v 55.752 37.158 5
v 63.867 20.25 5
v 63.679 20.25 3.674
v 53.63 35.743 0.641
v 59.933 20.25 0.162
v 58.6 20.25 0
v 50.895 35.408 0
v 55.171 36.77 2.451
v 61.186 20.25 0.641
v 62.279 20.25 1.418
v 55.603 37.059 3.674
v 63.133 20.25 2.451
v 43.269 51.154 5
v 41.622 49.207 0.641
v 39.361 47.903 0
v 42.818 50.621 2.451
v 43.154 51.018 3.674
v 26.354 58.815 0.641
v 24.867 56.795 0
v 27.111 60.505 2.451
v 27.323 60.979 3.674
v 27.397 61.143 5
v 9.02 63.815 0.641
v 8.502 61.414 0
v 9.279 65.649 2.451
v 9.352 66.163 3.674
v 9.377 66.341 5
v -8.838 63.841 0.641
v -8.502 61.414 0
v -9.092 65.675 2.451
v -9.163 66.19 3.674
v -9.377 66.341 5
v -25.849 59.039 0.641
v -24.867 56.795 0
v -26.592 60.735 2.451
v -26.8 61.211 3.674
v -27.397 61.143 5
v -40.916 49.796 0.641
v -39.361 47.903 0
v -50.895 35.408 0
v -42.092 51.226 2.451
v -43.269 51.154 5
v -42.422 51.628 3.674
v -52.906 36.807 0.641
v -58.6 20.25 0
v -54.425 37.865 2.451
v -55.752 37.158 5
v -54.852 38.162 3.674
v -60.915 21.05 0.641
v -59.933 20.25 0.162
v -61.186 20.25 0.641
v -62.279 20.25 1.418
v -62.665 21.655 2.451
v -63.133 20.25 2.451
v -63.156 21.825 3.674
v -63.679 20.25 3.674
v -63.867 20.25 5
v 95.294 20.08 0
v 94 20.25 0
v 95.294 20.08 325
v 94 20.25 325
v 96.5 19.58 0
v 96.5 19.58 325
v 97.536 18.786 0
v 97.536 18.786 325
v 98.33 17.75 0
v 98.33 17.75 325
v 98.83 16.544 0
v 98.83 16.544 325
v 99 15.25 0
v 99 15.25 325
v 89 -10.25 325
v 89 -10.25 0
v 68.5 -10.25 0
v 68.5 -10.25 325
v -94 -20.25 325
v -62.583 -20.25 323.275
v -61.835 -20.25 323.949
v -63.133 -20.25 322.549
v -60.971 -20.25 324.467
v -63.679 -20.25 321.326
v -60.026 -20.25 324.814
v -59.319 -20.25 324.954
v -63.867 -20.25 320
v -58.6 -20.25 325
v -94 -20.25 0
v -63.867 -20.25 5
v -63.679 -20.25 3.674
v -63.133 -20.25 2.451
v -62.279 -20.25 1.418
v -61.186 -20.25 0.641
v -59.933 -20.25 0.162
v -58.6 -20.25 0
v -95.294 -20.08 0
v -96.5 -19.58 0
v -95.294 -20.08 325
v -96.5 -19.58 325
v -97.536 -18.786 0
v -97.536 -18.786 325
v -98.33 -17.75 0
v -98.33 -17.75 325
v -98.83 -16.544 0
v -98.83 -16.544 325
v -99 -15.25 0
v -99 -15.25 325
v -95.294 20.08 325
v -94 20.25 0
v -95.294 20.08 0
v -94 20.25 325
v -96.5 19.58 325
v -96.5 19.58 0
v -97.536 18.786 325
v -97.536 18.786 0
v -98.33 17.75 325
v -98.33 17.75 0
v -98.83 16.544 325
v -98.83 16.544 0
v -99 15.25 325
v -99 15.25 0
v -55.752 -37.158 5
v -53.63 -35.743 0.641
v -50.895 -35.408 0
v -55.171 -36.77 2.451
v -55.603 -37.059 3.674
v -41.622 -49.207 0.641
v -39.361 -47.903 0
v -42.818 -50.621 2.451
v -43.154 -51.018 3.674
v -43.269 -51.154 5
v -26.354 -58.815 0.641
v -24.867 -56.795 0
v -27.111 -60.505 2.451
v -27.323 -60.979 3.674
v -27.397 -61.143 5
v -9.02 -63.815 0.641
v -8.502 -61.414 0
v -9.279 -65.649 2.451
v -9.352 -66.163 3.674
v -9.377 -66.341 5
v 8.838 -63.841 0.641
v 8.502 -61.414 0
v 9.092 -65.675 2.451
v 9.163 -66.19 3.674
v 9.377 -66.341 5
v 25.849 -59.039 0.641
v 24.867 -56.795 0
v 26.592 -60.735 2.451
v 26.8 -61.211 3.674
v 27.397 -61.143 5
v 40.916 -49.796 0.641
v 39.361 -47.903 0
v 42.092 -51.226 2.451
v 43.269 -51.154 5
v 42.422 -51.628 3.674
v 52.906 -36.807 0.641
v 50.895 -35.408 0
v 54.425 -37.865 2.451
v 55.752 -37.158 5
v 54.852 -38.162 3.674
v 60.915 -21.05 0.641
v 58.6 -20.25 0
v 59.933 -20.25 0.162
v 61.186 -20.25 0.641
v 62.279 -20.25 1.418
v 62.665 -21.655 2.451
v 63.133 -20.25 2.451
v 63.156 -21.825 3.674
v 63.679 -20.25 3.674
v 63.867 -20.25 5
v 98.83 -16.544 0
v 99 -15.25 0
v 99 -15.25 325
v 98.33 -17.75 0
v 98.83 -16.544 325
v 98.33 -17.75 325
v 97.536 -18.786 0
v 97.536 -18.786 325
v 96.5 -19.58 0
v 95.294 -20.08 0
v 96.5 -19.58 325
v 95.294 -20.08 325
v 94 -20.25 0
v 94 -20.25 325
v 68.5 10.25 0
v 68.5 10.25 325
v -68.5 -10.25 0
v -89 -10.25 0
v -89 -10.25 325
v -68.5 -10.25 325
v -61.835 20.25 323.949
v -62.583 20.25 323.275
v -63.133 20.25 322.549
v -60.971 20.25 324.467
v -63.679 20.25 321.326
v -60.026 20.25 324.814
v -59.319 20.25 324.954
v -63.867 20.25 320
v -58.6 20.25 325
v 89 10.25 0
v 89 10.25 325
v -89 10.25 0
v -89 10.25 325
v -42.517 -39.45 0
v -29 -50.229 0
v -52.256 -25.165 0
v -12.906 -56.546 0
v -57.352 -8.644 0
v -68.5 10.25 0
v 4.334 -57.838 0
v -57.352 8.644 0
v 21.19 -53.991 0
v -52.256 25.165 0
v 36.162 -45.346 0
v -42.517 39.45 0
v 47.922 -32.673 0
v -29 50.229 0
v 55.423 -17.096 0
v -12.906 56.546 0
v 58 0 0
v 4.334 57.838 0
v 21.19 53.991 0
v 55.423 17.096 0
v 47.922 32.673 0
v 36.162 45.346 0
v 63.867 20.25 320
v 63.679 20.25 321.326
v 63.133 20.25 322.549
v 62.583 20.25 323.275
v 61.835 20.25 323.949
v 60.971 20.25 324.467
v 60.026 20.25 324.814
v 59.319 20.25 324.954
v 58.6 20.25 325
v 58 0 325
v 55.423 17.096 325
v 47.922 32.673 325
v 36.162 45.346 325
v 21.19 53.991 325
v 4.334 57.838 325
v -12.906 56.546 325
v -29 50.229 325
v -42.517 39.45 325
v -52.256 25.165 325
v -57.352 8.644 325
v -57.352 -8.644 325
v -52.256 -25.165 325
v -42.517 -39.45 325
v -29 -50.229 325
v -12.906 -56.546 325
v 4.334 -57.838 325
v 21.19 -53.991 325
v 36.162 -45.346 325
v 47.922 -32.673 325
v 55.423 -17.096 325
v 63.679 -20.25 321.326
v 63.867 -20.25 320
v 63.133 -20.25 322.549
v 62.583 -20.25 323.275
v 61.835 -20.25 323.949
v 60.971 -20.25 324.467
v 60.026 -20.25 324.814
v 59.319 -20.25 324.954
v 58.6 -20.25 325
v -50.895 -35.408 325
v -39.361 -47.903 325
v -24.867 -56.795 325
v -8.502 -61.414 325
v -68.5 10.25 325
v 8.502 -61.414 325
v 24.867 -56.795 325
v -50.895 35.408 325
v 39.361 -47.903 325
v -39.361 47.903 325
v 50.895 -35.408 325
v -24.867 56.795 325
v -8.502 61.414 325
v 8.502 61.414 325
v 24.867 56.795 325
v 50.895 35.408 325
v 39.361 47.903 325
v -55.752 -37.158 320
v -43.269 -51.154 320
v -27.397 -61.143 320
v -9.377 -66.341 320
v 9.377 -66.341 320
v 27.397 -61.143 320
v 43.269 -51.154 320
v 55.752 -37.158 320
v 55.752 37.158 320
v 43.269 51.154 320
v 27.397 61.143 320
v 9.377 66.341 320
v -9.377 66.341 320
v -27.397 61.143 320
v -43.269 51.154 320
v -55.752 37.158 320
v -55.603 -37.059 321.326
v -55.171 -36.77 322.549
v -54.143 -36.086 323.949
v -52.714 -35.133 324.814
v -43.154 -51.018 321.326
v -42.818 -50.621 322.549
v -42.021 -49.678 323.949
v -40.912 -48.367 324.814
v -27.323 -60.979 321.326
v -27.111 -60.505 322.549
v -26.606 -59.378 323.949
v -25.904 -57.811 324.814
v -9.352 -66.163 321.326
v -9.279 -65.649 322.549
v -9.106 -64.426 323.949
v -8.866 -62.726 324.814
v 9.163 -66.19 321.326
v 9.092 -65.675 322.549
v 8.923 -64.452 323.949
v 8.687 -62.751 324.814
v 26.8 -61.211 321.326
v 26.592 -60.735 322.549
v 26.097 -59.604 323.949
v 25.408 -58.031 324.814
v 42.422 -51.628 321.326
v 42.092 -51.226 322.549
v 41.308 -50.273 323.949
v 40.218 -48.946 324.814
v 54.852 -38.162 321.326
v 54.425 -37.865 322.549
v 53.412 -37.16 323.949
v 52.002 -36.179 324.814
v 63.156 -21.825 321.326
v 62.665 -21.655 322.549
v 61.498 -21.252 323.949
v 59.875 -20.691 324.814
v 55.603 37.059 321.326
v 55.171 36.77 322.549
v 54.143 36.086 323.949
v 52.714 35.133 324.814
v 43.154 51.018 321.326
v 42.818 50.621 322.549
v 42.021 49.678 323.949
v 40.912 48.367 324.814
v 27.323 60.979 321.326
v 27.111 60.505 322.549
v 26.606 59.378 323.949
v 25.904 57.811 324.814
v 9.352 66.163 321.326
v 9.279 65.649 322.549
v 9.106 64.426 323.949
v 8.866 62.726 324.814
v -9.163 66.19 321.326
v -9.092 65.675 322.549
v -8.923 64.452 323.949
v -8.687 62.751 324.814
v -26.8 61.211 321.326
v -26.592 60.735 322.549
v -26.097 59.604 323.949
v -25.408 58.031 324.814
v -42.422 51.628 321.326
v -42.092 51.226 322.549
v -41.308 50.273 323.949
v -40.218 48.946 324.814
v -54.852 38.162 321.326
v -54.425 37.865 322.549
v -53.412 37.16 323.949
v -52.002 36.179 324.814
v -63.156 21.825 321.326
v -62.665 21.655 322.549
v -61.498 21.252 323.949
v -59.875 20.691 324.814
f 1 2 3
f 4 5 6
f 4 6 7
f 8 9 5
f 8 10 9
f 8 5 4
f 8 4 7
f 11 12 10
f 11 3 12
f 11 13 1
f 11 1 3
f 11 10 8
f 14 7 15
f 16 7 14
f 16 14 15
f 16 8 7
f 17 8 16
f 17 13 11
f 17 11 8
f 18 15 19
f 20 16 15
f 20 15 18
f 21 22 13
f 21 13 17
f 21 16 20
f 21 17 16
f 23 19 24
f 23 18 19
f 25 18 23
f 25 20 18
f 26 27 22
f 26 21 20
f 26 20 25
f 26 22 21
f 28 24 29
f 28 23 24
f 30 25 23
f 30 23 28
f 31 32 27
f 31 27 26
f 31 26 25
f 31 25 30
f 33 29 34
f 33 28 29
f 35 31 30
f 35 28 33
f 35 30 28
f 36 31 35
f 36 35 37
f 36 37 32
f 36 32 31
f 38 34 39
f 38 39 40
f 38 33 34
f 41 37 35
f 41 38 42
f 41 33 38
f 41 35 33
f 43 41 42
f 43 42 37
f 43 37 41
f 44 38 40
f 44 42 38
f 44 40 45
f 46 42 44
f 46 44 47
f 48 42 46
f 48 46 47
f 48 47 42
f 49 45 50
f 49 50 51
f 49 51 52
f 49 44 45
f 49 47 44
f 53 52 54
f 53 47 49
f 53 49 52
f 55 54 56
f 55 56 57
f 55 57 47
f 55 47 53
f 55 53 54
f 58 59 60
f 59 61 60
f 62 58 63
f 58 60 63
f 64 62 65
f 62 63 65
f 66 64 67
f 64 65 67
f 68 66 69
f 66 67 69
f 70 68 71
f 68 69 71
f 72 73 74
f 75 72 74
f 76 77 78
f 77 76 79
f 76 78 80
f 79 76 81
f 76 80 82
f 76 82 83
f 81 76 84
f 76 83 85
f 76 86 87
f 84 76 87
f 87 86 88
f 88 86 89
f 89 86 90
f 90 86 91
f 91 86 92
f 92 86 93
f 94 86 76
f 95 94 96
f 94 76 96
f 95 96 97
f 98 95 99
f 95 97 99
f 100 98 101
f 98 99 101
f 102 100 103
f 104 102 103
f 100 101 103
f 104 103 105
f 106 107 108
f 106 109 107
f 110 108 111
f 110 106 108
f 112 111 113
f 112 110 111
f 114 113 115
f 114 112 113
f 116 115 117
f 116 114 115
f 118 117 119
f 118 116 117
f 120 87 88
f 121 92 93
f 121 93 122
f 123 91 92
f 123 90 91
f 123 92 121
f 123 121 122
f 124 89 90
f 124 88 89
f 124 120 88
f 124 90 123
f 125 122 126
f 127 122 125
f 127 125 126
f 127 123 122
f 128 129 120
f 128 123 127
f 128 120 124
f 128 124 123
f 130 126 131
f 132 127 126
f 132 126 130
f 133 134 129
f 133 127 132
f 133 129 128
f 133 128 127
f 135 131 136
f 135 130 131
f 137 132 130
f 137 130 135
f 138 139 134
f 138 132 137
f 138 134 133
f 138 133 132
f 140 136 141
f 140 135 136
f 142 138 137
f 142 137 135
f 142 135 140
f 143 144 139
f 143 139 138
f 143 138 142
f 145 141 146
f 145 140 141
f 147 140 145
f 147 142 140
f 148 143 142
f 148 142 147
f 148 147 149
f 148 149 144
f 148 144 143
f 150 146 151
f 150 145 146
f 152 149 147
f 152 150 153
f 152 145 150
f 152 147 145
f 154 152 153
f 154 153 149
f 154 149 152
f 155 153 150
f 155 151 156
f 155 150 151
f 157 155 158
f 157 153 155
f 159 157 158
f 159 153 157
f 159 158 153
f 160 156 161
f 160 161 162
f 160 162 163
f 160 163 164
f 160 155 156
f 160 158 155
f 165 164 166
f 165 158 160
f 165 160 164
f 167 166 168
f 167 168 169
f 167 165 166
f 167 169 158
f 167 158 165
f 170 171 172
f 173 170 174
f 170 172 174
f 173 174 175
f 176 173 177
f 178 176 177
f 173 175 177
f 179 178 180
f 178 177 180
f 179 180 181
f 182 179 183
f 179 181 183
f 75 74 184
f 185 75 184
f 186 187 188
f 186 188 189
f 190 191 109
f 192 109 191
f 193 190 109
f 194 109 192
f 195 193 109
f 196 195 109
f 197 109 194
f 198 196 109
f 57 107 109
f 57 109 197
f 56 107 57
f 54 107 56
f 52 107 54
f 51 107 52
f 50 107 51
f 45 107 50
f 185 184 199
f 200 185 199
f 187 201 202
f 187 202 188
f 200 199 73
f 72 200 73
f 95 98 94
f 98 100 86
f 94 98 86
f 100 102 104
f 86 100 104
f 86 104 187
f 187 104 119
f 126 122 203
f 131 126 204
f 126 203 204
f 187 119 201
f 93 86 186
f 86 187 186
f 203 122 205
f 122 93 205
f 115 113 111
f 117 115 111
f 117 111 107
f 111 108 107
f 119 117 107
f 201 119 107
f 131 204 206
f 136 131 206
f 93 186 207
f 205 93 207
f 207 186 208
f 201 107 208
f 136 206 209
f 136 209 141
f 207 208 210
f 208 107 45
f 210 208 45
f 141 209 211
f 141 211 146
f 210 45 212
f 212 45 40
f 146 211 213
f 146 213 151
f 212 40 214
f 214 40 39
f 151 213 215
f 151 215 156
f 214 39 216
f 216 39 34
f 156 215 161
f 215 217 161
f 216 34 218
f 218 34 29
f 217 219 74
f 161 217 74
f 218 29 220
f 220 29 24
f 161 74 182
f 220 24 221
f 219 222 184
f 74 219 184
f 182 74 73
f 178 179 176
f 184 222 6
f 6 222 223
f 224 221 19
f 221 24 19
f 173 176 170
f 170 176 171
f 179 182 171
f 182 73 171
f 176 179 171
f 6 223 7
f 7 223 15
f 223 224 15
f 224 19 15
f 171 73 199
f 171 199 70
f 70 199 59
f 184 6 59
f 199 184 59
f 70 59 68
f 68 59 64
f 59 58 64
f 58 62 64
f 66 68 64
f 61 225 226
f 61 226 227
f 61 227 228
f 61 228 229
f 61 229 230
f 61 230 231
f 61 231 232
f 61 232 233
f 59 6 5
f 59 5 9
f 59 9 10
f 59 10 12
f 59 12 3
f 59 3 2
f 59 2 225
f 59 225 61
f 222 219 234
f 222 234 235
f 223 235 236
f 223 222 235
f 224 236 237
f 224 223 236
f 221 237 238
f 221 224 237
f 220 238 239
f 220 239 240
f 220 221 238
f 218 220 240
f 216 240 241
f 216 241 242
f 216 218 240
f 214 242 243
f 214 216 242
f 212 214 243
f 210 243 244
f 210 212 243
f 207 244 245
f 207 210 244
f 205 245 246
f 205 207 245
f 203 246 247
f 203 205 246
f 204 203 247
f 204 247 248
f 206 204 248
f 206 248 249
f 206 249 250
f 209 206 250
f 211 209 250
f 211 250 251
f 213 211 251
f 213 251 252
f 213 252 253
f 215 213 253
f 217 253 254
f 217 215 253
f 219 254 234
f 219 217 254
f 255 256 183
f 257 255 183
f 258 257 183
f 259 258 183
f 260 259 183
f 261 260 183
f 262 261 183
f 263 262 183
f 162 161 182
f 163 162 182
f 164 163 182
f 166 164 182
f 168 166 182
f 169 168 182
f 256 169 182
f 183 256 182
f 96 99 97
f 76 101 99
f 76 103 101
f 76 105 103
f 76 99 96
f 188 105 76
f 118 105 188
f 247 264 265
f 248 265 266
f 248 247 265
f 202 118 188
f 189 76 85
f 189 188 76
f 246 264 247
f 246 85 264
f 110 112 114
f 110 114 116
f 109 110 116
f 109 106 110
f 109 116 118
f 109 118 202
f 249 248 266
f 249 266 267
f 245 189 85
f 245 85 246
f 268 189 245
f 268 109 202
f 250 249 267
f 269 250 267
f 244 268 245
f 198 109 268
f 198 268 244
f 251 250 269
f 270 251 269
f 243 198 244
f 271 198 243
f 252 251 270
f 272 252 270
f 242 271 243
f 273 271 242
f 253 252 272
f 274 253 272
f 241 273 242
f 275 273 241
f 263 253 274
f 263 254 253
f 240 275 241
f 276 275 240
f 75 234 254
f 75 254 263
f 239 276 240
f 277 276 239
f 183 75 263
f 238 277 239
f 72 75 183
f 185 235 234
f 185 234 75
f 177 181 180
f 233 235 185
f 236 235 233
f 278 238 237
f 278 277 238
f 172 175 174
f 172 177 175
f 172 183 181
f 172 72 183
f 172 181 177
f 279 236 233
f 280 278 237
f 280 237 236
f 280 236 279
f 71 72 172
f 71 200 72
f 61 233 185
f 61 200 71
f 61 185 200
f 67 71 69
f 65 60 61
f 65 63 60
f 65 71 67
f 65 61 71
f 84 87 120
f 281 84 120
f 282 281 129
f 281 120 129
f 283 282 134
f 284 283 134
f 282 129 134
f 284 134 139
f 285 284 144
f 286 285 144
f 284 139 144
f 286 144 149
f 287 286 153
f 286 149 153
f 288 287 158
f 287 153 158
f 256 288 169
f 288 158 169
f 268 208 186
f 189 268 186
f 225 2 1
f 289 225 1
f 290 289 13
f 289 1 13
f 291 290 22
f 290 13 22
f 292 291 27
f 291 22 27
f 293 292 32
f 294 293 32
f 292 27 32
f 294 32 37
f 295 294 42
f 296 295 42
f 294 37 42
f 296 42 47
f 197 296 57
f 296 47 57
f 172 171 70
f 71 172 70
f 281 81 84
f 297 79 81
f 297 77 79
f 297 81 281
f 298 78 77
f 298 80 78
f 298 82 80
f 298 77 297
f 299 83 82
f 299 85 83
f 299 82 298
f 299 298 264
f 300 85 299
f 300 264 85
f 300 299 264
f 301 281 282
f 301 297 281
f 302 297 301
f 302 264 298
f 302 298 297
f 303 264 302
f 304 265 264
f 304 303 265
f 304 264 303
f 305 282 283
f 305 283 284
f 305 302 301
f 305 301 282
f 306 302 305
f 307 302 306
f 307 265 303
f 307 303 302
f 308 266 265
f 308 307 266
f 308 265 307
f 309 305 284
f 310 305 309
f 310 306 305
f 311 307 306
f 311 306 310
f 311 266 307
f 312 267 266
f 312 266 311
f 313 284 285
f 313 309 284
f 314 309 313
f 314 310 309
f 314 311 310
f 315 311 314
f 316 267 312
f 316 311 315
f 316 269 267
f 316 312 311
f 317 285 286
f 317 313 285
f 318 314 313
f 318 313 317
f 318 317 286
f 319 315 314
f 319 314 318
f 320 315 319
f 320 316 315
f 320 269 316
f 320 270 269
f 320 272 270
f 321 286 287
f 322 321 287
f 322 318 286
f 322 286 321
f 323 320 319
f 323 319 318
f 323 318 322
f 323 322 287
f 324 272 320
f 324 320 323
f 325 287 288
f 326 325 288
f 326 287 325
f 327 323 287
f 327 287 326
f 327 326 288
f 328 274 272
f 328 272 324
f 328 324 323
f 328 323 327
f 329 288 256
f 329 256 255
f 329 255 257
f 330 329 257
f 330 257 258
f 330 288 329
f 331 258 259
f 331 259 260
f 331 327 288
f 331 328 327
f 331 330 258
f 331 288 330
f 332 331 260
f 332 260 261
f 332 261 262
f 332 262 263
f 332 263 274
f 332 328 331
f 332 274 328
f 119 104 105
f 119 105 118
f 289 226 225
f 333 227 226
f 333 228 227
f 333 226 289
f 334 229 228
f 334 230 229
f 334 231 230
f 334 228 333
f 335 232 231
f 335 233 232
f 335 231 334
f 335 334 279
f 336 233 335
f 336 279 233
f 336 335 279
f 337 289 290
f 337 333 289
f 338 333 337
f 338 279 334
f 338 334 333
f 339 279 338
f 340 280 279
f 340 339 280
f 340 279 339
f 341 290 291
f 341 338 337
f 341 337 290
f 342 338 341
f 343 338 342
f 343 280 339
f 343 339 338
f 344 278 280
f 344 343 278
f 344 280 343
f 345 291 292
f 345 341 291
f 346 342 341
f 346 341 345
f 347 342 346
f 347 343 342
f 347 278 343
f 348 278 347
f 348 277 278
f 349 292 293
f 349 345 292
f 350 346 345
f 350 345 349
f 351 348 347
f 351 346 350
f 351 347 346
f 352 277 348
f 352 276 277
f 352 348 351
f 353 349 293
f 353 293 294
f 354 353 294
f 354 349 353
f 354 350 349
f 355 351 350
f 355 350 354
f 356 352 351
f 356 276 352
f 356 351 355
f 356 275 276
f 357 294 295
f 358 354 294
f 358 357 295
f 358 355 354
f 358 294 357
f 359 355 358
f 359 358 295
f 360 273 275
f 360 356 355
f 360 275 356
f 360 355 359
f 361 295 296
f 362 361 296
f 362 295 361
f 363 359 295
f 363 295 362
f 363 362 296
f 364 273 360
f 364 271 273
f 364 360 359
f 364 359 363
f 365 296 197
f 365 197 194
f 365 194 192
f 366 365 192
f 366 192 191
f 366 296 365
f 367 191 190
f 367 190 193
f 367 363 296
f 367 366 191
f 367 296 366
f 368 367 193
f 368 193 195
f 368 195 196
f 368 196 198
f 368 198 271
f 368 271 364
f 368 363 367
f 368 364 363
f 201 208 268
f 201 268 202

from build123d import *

# Parameters (mm, degrees)
SKETCH1_R           = 67
SKETCH1_R_2         = 58
SKETCH1_W           = 40.5
SKETCH1_H           = 40.5
BOSS_EXTRUDE6_DEPTH = 325
FILLET4_R           = 5


with BuildPart() as part:
    # Sketch1 → Boss-Extrude6 (new body)
    # profile 1 of 3: a face of its own
    with BuildSketch(Plane.XY):
        Circle(SKETCH1_R)
        Circle(SKETCH1_R_2, mode=Mode.SUBTRACT)
    # profile 2 of 3: a face of its own
    with BuildSketch(Plane.XY):
        with Locations((-78.75, 0)):
            Rectangle(SKETCH1_W, SKETCH1_H)
        Polygon((-68.5, -1.08327383), (-68.5, 10.25), (-89, 10.25), (-89, -10.25), (-68.5, -10.25), align=None, mode=Mode.SUBTRACT)
    # profile 3 of 3: a face of its own
    with BuildSketch(Plane.XY):
        with Locations((78.75, 0)):
            Rectangle(SKETCH1_W, SKETCH1_H)
        Polygon((68.5, 10.25), (89, 10.25), (89, -10.25), (68.5, -10.25), (68.5, -1.08327383), align=None, mode=Mode.SUBTRACT)
    extrude(amount=BOSS_EXTRUDE6_DEPTH)

    # Fillet4
    fillet4_edges = [part.edges().sort_by_distance(p)[0] for p in [
        (0, -67, 0),
        (0, -67, 325),
        (0, 67, 0),
        (99, 20.25, 162.5),
        (99, -20.25, 162.5),
        (-99, -20.25, 162.5),
        (-99, 20.25, 162.5),
        (0, 67, 325),
    ]]
    fillet(fillet4_edges, radius=FILLET4_R)


solid = part.part
